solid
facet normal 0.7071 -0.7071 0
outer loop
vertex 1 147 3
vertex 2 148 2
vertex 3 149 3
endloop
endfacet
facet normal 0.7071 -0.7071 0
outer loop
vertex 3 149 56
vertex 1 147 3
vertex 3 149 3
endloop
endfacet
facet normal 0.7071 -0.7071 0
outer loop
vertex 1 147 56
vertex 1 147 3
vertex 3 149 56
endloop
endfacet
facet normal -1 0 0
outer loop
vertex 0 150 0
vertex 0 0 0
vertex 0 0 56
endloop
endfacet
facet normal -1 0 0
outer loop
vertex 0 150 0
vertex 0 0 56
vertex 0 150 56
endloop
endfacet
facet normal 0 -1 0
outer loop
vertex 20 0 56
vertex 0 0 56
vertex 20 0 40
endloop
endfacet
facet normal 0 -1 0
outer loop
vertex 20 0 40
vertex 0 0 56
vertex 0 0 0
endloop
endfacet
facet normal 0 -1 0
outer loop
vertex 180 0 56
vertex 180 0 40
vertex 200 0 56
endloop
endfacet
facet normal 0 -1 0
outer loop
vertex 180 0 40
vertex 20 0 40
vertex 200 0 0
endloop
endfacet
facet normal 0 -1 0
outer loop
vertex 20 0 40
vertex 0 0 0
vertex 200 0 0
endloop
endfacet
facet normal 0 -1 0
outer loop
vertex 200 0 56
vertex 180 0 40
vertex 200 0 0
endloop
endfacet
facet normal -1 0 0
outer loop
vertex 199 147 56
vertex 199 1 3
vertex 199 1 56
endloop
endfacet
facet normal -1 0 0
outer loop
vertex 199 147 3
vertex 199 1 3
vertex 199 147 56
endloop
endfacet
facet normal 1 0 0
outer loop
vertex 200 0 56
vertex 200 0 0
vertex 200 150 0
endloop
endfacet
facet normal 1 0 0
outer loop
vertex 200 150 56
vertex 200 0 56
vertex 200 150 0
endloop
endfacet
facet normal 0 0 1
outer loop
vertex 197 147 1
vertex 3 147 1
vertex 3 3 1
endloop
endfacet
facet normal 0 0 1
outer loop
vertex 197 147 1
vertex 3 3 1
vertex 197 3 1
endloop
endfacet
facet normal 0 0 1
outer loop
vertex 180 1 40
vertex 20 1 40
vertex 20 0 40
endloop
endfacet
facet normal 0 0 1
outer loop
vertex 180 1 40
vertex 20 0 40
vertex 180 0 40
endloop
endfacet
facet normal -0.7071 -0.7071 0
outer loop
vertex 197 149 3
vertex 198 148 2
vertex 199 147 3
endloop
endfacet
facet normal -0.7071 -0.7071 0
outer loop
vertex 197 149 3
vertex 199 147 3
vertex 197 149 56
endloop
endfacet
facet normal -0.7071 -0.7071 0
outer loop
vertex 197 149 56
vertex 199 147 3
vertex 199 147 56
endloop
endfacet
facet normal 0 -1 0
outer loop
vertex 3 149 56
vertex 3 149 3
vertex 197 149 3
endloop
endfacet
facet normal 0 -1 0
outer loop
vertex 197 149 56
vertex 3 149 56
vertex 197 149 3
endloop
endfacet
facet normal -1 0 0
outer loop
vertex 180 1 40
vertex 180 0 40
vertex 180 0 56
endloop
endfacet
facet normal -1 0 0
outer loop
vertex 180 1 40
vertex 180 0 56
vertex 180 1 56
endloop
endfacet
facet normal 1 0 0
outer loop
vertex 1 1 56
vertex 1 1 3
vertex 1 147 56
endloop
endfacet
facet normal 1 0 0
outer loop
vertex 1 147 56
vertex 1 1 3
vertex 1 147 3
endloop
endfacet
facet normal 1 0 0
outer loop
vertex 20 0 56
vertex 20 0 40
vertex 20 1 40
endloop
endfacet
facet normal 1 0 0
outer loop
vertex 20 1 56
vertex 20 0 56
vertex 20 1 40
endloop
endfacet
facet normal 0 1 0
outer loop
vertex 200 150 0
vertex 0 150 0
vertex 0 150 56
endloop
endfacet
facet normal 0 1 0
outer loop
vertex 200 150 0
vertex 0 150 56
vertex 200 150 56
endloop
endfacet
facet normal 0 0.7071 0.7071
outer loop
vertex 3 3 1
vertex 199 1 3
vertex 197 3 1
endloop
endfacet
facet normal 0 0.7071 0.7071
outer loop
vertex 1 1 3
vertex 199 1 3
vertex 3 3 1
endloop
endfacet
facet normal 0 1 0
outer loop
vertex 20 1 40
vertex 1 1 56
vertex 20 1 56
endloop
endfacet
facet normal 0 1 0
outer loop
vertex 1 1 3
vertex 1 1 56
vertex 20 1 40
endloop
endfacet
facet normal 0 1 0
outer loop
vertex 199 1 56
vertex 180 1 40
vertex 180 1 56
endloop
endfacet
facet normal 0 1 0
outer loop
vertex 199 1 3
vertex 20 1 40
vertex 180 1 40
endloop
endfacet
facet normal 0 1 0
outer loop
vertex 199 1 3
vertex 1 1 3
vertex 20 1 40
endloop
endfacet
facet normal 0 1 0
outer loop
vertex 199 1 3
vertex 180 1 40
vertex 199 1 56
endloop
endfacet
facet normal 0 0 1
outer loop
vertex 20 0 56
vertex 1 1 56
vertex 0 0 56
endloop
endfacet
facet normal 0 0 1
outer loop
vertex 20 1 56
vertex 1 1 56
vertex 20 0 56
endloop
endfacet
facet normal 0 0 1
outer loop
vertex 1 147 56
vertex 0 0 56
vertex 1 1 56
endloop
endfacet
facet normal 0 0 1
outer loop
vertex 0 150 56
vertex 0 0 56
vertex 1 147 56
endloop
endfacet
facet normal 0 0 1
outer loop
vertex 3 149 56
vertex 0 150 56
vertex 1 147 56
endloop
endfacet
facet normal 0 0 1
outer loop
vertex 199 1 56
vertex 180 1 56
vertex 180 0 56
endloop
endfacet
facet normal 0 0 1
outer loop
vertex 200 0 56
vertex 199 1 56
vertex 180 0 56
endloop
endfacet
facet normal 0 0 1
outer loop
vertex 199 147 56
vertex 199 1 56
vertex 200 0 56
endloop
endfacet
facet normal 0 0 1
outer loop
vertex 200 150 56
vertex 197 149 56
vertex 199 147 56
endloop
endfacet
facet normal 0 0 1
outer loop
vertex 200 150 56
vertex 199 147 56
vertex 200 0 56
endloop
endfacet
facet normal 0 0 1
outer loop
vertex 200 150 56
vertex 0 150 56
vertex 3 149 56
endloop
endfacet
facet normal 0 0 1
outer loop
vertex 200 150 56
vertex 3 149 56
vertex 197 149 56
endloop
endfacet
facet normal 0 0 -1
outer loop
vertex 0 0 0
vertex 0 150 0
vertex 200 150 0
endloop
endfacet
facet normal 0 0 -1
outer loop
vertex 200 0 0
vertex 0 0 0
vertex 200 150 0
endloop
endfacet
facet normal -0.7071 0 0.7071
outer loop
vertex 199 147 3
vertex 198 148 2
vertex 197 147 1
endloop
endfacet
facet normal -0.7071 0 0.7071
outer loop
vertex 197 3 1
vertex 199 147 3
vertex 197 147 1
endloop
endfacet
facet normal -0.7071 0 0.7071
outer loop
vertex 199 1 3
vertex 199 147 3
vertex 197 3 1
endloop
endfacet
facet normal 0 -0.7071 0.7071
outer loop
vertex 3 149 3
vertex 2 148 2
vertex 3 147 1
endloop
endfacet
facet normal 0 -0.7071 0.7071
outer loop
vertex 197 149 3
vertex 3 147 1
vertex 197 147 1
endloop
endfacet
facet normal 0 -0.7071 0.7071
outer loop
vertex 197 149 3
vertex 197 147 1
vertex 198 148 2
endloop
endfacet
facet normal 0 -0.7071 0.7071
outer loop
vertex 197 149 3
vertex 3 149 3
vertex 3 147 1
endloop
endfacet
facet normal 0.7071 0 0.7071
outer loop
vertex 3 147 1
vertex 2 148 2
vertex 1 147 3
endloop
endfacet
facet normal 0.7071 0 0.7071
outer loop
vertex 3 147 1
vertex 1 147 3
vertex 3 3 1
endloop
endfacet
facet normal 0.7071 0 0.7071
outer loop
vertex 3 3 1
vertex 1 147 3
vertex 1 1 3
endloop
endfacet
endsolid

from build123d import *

# Parameters (mm, degrees)
BOX005_W        = 20
BOX005_H        = 1
BOX005_DEPTH    = 56
BOX006_W        = 20
BOX006_H        = 1
BOX006_DEPTH    = 56
BOX004_W        = 200
BOX004_H        = 1
BOX004_DEPTH    = 40
BOX002_W        = 1
BOX002_H        = 150
BOX002_DEPTH    = 56
BOX001_W        = 1
BOX001_H        = 150
BOX001_DEPTH    = 56
BOX_W           = 200
BOX_H           = 150
BOX_DEPTH       = 1
BOX003_W        = 200
BOX003_H        = 1
BOX003_DEPTH    = 56
CHAMFER_SIZE    = 2
CHAMFER001_SIZE = 2
CHAMFER002_SIZE = 2
CHAMFER003_SIZE = 2
CHAMFER004_SIZE = 2
CHAMFER005_SIZE = 2


with BuildPart() as cube005:
    # Box005 → Box005 (new body)
    with BuildSketch(Plane.XY):
        with Locations((10, 0.5)):
            Rectangle(BOX005_W, BOX005_H)
    extrude(amount=BOX005_DEPTH)


with BuildPart() as cube006:
    # Box006 → Box006 (new body)
    with BuildSketch(Plane(origin=(180, 0, 0), x_dir=(1, 0, 0), z_dir=(0, 0, 1))):
        with Locations((10, 0.5)):
            Rectangle(BOX006_W, BOX006_H)
    extrude(amount=BOX006_DEPTH)


with BuildPart() as cube004:
    # Box004 → Box004 (new body)
    with BuildSketch(Plane.XY):
        with Locations((100, 0.5)):
            Rectangle(BOX004_W, BOX004_H)
    extrude(amount=BOX004_DEPTH)


with BuildPart() as cube002:
    # Box002 → Box002 (new body)
    with BuildSketch(Plane(origin=(199, 0, 0), x_dir=(1, 0, 0), z_dir=(0, 0, 1))):
        with Locations((0.5, 75)):
            Rectangle(BOX002_W, BOX002_H)
    extrude(amount=BOX002_DEPTH)


with BuildPart() as cube001:
    # Box001 → Box001 (new body)
    with BuildSketch(Plane.XY):
        with Locations((0.5, 75)):
            Rectangle(BOX001_W, BOX001_H)
    extrude(amount=BOX001_DEPTH)


with BuildPart() as cube:
    # Box → Box (new body)
    with BuildSketch(Plane.XY):
        with Locations((100, 75)):
            Rectangle(BOX_W, BOX_H)
    extrude(amount=BOX_DEPTH)


with BuildPart() as fusion005:
    # Box003 → Box003 (new body)
    with BuildSketch(Plane(origin=(0, 149, 0), x_dir=(1, 0, 0), z_dir=(0, 0, 1))):
        with Locations((100, 0.5)):
            Rectangle(BOX003_W, BOX003_H)
    extrude(amount=BOX003_DEPTH)

    # Fusion: union Cube
    add(cube.part)

    # Fusion001: union Cube001
    add(cube001.part)

    # Fusion002: union Cube002
    add(cube002.part)

    # Fusion003: union Cube004
    add(cube004.part)

    # Chamfer
    chamfer_edges = [fusion005.edges().sort_by_distance(p)[0] for p in [
        (100, 149, 1),
    ]]
    chamfer(chamfer_edges, length=CHAMFER_SIZE)

    # Chamfer001
    chamfer001_edges = [fusion005.edges().sort_by_distance(p)[0] for p in [
        (1, 74, 1),
    ]]
    chamfer(chamfer001_edges, length=CHAMFER001_SIZE)

    # Chamfer002
    chamfer002_edges = [fusion005.edges().sort_by_distance(p)[0] for p in [
        (199, 74, 1),
    ]]
    chamfer(chamfer002_edges, length=CHAMFER002_SIZE)

    # Chamfer003
    chamfer003_edges = [fusion005.edges().sort_by_distance(p)[0] for p in [
        (1, 149, 29.5),
    ]]
    chamfer(chamfer003_edges, length=CHAMFER003_SIZE)

    # Chamfer004
    chamfer004_edges = [fusion005.edges().sort_by_distance(p)[0] for p in [
        (199, 149, 29.5),
    ]]
    chamfer(chamfer004_edges, length=CHAMFER004_SIZE)

    # Chamfer005
    chamfer005_edges = [fusion005.edges().sort_by_distance(p)[0] for p in [
        (100, 1, 1),
    ]]
    chamfer(chamfer005_edges, length=CHAMFER005_SIZE)

    # Fusion004: union Cube006
    add(cube006.part)

    # Fusion005: union Cube005
    add(cube005.part)


solid = fusion005.part
